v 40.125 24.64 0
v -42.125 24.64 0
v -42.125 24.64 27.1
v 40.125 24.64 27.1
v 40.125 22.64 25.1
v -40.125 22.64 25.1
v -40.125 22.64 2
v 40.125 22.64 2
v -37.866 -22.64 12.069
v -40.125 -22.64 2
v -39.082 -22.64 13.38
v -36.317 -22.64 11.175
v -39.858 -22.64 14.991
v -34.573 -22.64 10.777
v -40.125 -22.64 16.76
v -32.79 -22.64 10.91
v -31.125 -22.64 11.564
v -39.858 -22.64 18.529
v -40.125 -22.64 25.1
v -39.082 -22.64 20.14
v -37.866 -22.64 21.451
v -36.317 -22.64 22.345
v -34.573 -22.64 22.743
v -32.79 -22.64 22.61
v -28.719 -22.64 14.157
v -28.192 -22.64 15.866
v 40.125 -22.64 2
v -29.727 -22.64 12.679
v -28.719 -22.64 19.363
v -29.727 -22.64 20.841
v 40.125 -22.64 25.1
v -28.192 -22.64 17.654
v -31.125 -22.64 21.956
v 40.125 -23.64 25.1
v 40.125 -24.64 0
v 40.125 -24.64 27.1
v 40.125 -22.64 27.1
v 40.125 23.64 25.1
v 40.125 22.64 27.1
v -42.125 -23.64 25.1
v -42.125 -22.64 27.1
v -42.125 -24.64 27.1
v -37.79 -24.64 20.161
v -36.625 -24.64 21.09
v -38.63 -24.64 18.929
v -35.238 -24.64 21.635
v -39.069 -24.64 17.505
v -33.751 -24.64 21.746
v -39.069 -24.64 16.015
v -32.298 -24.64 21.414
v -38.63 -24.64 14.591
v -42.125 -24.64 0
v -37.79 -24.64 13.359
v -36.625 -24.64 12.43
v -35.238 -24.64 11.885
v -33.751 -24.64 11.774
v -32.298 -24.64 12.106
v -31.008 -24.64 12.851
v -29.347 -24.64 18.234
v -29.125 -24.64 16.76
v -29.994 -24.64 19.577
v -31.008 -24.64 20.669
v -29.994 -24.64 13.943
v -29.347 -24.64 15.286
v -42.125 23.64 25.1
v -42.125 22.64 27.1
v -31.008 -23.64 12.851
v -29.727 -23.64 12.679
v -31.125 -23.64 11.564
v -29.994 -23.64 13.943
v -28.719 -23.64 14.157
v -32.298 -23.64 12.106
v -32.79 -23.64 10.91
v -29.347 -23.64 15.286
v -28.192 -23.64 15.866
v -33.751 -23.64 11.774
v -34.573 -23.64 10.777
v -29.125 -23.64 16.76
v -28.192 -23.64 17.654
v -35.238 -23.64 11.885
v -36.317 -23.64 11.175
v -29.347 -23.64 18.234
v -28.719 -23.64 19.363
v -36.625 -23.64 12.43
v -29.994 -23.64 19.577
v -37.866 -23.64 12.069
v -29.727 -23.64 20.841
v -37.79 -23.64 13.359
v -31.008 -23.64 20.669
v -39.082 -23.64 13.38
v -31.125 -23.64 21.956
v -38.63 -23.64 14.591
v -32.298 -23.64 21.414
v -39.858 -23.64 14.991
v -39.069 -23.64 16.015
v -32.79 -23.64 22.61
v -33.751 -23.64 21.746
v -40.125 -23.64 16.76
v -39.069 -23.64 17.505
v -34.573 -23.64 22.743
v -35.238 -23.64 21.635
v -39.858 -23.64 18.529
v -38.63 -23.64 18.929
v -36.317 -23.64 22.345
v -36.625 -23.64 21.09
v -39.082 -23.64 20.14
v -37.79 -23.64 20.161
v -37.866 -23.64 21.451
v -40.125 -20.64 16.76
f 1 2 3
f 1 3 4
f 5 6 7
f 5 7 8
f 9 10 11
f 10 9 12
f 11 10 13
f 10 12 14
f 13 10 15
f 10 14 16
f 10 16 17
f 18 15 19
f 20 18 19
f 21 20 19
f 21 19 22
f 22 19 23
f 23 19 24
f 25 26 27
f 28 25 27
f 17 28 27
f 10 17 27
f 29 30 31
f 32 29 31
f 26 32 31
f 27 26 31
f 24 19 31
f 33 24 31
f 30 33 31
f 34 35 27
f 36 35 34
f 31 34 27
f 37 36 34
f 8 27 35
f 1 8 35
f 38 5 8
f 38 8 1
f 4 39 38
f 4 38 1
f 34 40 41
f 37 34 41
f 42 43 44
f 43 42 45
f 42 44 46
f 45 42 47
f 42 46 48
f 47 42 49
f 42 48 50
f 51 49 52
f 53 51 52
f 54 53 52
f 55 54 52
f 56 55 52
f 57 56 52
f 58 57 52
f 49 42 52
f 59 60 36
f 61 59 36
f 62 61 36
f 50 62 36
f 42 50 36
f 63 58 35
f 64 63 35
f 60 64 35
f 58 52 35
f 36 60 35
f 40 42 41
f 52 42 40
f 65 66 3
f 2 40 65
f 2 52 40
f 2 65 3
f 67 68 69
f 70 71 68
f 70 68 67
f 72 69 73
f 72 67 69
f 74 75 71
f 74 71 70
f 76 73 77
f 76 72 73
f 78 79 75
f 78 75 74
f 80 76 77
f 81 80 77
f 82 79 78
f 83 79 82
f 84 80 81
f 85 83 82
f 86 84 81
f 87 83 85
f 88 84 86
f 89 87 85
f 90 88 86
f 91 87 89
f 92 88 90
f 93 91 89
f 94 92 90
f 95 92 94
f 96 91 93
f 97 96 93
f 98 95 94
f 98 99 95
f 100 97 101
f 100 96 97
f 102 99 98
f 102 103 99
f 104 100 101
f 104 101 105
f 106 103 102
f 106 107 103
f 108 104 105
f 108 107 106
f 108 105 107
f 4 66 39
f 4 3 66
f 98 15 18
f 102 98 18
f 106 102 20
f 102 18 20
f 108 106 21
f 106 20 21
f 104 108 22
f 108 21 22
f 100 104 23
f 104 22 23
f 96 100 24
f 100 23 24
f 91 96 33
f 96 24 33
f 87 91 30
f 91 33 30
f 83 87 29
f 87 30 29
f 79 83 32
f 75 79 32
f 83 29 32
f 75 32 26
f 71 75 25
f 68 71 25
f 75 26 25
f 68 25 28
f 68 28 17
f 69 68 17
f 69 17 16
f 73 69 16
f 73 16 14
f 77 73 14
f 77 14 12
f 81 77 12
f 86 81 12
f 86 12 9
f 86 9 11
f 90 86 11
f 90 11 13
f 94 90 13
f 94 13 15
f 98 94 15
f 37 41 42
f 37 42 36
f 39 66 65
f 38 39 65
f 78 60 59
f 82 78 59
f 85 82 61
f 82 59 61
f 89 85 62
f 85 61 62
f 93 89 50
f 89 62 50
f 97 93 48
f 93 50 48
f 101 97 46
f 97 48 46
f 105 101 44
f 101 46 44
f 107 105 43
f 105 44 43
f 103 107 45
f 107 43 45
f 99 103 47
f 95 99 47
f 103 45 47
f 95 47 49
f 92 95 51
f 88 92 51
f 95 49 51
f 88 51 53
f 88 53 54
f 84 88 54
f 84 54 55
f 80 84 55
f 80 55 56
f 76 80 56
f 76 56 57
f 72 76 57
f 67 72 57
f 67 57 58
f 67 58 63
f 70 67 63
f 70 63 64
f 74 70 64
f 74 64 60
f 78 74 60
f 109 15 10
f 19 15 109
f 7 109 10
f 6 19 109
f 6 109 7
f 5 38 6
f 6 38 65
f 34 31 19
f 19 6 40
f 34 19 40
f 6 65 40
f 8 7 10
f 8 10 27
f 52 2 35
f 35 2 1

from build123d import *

# Parameters (mm, degrees)
F0_W           = 84.25
F0_H           = 49.28
F1_DEPTH       = 27.1
F2_W           = 80.25
F2_H           = 45.28
F3_DEPTH       = 25.1
F5_DEPTH       = 25
F5_DEPTH_BACK  = 25
F8_D           = 10
F8_DEPTH       = 2
F8_CBORE_D     = 12
F8_CBORE_DEPTH = 1
F9_W           = 4
F9_H           = 45.28
F10_DEPTH      = 2
F12_DEPTH      = 82.25
F13_W          = 49.28
F13_H          = 27.1
F13_W_2        = 18.18
F13_H_2        = 11.31
F14_DEPTH      = 2


with BuildPart() as f1:
    # F0 (on Top) → F1 (new body)
    with BuildSketch(Plane.XY):
        Rectangle(F0_W, F0_H)
    extrude(amount=F1_DEPTH)

    # F2 (on face) → F3 (cut)
    with BuildSketch(Plane.XY.offset(27.1)):
        Rectangle(F2_W, F2_H)
    extrude(amount=-F3_DEPTH, mode=Mode.SUBTRACT)

    # F4 (on face) → F5 (cut, two sides)
    with BuildSketch(Plane(origin=(40.125, 0, 0), x_dir=(0, -1, 0), z_dir=(-1, 0, 0))) as f5_sk:
        Polygon((-4.46, 20.205), (-22.64, 20.205), (-22.64, 14.55), (-22.64, 8.895), (-4.46, 8.895), align=None)
    extrude(amount=-F5_DEPTH, mode=Mode.SUBTRACT)
    extrude(f5_sk.sketch, amount=-F5_DEPTH_BACK, mode=Mode.SUBTRACT)

    # F8
    with Locations(Plane(origin=(0, -22.64, 0), x_dir=(-1, 0, 0), z_dir=(0, 1, 0))):
        with Locations((34.125, 16.76)):
            CounterBoreHole(F8_D / 2, F8_CBORE_D / 2, F8_CBORE_DEPTH, depth=F8_DEPTH)

    # F9 (on face) → F10 (cut)
    with BuildSketch(Plane.XY.offset(27.1)):
        with Locations((-40.125, 0)):
            Rectangle(F9_W, F9_H)
    extrude(amount=-F10_DEPTH, mode=Mode.SUBTRACT)

    # F11 (on face) → F12 (cut)
    with BuildSketch(Plane(origin=(-42.125, 0, 0), x_dir=(0, -1, 0), z_dir=(-1, 0, 0))):
        Polygon((22.64, 27.1), (22.64, 25.1), (23.64, 25.1), align=None)
        Polygon((-22.64, 27.1), (-23.64, 25.1), (-22.64, 25.1), align=None)
    extrude(amount=-F12_DEPTH, mode=Mode.SUBTRACT)

    # F13 (on face) → F14 (cut)
    with BuildSketch(Plane.YZ.offset(42.125)):
        with Locations((0, 13.55)):
            Rectangle(F13_W, F13_H)
        with Locations((13.55, 14.55)):
            Rectangle(F13_W_2, F13_H_2, mode=Mode.SUBTRACT)
    extrude(amount=-F14_DEPTH, mode=Mode.SUBTRACT)


solid = f1.part
